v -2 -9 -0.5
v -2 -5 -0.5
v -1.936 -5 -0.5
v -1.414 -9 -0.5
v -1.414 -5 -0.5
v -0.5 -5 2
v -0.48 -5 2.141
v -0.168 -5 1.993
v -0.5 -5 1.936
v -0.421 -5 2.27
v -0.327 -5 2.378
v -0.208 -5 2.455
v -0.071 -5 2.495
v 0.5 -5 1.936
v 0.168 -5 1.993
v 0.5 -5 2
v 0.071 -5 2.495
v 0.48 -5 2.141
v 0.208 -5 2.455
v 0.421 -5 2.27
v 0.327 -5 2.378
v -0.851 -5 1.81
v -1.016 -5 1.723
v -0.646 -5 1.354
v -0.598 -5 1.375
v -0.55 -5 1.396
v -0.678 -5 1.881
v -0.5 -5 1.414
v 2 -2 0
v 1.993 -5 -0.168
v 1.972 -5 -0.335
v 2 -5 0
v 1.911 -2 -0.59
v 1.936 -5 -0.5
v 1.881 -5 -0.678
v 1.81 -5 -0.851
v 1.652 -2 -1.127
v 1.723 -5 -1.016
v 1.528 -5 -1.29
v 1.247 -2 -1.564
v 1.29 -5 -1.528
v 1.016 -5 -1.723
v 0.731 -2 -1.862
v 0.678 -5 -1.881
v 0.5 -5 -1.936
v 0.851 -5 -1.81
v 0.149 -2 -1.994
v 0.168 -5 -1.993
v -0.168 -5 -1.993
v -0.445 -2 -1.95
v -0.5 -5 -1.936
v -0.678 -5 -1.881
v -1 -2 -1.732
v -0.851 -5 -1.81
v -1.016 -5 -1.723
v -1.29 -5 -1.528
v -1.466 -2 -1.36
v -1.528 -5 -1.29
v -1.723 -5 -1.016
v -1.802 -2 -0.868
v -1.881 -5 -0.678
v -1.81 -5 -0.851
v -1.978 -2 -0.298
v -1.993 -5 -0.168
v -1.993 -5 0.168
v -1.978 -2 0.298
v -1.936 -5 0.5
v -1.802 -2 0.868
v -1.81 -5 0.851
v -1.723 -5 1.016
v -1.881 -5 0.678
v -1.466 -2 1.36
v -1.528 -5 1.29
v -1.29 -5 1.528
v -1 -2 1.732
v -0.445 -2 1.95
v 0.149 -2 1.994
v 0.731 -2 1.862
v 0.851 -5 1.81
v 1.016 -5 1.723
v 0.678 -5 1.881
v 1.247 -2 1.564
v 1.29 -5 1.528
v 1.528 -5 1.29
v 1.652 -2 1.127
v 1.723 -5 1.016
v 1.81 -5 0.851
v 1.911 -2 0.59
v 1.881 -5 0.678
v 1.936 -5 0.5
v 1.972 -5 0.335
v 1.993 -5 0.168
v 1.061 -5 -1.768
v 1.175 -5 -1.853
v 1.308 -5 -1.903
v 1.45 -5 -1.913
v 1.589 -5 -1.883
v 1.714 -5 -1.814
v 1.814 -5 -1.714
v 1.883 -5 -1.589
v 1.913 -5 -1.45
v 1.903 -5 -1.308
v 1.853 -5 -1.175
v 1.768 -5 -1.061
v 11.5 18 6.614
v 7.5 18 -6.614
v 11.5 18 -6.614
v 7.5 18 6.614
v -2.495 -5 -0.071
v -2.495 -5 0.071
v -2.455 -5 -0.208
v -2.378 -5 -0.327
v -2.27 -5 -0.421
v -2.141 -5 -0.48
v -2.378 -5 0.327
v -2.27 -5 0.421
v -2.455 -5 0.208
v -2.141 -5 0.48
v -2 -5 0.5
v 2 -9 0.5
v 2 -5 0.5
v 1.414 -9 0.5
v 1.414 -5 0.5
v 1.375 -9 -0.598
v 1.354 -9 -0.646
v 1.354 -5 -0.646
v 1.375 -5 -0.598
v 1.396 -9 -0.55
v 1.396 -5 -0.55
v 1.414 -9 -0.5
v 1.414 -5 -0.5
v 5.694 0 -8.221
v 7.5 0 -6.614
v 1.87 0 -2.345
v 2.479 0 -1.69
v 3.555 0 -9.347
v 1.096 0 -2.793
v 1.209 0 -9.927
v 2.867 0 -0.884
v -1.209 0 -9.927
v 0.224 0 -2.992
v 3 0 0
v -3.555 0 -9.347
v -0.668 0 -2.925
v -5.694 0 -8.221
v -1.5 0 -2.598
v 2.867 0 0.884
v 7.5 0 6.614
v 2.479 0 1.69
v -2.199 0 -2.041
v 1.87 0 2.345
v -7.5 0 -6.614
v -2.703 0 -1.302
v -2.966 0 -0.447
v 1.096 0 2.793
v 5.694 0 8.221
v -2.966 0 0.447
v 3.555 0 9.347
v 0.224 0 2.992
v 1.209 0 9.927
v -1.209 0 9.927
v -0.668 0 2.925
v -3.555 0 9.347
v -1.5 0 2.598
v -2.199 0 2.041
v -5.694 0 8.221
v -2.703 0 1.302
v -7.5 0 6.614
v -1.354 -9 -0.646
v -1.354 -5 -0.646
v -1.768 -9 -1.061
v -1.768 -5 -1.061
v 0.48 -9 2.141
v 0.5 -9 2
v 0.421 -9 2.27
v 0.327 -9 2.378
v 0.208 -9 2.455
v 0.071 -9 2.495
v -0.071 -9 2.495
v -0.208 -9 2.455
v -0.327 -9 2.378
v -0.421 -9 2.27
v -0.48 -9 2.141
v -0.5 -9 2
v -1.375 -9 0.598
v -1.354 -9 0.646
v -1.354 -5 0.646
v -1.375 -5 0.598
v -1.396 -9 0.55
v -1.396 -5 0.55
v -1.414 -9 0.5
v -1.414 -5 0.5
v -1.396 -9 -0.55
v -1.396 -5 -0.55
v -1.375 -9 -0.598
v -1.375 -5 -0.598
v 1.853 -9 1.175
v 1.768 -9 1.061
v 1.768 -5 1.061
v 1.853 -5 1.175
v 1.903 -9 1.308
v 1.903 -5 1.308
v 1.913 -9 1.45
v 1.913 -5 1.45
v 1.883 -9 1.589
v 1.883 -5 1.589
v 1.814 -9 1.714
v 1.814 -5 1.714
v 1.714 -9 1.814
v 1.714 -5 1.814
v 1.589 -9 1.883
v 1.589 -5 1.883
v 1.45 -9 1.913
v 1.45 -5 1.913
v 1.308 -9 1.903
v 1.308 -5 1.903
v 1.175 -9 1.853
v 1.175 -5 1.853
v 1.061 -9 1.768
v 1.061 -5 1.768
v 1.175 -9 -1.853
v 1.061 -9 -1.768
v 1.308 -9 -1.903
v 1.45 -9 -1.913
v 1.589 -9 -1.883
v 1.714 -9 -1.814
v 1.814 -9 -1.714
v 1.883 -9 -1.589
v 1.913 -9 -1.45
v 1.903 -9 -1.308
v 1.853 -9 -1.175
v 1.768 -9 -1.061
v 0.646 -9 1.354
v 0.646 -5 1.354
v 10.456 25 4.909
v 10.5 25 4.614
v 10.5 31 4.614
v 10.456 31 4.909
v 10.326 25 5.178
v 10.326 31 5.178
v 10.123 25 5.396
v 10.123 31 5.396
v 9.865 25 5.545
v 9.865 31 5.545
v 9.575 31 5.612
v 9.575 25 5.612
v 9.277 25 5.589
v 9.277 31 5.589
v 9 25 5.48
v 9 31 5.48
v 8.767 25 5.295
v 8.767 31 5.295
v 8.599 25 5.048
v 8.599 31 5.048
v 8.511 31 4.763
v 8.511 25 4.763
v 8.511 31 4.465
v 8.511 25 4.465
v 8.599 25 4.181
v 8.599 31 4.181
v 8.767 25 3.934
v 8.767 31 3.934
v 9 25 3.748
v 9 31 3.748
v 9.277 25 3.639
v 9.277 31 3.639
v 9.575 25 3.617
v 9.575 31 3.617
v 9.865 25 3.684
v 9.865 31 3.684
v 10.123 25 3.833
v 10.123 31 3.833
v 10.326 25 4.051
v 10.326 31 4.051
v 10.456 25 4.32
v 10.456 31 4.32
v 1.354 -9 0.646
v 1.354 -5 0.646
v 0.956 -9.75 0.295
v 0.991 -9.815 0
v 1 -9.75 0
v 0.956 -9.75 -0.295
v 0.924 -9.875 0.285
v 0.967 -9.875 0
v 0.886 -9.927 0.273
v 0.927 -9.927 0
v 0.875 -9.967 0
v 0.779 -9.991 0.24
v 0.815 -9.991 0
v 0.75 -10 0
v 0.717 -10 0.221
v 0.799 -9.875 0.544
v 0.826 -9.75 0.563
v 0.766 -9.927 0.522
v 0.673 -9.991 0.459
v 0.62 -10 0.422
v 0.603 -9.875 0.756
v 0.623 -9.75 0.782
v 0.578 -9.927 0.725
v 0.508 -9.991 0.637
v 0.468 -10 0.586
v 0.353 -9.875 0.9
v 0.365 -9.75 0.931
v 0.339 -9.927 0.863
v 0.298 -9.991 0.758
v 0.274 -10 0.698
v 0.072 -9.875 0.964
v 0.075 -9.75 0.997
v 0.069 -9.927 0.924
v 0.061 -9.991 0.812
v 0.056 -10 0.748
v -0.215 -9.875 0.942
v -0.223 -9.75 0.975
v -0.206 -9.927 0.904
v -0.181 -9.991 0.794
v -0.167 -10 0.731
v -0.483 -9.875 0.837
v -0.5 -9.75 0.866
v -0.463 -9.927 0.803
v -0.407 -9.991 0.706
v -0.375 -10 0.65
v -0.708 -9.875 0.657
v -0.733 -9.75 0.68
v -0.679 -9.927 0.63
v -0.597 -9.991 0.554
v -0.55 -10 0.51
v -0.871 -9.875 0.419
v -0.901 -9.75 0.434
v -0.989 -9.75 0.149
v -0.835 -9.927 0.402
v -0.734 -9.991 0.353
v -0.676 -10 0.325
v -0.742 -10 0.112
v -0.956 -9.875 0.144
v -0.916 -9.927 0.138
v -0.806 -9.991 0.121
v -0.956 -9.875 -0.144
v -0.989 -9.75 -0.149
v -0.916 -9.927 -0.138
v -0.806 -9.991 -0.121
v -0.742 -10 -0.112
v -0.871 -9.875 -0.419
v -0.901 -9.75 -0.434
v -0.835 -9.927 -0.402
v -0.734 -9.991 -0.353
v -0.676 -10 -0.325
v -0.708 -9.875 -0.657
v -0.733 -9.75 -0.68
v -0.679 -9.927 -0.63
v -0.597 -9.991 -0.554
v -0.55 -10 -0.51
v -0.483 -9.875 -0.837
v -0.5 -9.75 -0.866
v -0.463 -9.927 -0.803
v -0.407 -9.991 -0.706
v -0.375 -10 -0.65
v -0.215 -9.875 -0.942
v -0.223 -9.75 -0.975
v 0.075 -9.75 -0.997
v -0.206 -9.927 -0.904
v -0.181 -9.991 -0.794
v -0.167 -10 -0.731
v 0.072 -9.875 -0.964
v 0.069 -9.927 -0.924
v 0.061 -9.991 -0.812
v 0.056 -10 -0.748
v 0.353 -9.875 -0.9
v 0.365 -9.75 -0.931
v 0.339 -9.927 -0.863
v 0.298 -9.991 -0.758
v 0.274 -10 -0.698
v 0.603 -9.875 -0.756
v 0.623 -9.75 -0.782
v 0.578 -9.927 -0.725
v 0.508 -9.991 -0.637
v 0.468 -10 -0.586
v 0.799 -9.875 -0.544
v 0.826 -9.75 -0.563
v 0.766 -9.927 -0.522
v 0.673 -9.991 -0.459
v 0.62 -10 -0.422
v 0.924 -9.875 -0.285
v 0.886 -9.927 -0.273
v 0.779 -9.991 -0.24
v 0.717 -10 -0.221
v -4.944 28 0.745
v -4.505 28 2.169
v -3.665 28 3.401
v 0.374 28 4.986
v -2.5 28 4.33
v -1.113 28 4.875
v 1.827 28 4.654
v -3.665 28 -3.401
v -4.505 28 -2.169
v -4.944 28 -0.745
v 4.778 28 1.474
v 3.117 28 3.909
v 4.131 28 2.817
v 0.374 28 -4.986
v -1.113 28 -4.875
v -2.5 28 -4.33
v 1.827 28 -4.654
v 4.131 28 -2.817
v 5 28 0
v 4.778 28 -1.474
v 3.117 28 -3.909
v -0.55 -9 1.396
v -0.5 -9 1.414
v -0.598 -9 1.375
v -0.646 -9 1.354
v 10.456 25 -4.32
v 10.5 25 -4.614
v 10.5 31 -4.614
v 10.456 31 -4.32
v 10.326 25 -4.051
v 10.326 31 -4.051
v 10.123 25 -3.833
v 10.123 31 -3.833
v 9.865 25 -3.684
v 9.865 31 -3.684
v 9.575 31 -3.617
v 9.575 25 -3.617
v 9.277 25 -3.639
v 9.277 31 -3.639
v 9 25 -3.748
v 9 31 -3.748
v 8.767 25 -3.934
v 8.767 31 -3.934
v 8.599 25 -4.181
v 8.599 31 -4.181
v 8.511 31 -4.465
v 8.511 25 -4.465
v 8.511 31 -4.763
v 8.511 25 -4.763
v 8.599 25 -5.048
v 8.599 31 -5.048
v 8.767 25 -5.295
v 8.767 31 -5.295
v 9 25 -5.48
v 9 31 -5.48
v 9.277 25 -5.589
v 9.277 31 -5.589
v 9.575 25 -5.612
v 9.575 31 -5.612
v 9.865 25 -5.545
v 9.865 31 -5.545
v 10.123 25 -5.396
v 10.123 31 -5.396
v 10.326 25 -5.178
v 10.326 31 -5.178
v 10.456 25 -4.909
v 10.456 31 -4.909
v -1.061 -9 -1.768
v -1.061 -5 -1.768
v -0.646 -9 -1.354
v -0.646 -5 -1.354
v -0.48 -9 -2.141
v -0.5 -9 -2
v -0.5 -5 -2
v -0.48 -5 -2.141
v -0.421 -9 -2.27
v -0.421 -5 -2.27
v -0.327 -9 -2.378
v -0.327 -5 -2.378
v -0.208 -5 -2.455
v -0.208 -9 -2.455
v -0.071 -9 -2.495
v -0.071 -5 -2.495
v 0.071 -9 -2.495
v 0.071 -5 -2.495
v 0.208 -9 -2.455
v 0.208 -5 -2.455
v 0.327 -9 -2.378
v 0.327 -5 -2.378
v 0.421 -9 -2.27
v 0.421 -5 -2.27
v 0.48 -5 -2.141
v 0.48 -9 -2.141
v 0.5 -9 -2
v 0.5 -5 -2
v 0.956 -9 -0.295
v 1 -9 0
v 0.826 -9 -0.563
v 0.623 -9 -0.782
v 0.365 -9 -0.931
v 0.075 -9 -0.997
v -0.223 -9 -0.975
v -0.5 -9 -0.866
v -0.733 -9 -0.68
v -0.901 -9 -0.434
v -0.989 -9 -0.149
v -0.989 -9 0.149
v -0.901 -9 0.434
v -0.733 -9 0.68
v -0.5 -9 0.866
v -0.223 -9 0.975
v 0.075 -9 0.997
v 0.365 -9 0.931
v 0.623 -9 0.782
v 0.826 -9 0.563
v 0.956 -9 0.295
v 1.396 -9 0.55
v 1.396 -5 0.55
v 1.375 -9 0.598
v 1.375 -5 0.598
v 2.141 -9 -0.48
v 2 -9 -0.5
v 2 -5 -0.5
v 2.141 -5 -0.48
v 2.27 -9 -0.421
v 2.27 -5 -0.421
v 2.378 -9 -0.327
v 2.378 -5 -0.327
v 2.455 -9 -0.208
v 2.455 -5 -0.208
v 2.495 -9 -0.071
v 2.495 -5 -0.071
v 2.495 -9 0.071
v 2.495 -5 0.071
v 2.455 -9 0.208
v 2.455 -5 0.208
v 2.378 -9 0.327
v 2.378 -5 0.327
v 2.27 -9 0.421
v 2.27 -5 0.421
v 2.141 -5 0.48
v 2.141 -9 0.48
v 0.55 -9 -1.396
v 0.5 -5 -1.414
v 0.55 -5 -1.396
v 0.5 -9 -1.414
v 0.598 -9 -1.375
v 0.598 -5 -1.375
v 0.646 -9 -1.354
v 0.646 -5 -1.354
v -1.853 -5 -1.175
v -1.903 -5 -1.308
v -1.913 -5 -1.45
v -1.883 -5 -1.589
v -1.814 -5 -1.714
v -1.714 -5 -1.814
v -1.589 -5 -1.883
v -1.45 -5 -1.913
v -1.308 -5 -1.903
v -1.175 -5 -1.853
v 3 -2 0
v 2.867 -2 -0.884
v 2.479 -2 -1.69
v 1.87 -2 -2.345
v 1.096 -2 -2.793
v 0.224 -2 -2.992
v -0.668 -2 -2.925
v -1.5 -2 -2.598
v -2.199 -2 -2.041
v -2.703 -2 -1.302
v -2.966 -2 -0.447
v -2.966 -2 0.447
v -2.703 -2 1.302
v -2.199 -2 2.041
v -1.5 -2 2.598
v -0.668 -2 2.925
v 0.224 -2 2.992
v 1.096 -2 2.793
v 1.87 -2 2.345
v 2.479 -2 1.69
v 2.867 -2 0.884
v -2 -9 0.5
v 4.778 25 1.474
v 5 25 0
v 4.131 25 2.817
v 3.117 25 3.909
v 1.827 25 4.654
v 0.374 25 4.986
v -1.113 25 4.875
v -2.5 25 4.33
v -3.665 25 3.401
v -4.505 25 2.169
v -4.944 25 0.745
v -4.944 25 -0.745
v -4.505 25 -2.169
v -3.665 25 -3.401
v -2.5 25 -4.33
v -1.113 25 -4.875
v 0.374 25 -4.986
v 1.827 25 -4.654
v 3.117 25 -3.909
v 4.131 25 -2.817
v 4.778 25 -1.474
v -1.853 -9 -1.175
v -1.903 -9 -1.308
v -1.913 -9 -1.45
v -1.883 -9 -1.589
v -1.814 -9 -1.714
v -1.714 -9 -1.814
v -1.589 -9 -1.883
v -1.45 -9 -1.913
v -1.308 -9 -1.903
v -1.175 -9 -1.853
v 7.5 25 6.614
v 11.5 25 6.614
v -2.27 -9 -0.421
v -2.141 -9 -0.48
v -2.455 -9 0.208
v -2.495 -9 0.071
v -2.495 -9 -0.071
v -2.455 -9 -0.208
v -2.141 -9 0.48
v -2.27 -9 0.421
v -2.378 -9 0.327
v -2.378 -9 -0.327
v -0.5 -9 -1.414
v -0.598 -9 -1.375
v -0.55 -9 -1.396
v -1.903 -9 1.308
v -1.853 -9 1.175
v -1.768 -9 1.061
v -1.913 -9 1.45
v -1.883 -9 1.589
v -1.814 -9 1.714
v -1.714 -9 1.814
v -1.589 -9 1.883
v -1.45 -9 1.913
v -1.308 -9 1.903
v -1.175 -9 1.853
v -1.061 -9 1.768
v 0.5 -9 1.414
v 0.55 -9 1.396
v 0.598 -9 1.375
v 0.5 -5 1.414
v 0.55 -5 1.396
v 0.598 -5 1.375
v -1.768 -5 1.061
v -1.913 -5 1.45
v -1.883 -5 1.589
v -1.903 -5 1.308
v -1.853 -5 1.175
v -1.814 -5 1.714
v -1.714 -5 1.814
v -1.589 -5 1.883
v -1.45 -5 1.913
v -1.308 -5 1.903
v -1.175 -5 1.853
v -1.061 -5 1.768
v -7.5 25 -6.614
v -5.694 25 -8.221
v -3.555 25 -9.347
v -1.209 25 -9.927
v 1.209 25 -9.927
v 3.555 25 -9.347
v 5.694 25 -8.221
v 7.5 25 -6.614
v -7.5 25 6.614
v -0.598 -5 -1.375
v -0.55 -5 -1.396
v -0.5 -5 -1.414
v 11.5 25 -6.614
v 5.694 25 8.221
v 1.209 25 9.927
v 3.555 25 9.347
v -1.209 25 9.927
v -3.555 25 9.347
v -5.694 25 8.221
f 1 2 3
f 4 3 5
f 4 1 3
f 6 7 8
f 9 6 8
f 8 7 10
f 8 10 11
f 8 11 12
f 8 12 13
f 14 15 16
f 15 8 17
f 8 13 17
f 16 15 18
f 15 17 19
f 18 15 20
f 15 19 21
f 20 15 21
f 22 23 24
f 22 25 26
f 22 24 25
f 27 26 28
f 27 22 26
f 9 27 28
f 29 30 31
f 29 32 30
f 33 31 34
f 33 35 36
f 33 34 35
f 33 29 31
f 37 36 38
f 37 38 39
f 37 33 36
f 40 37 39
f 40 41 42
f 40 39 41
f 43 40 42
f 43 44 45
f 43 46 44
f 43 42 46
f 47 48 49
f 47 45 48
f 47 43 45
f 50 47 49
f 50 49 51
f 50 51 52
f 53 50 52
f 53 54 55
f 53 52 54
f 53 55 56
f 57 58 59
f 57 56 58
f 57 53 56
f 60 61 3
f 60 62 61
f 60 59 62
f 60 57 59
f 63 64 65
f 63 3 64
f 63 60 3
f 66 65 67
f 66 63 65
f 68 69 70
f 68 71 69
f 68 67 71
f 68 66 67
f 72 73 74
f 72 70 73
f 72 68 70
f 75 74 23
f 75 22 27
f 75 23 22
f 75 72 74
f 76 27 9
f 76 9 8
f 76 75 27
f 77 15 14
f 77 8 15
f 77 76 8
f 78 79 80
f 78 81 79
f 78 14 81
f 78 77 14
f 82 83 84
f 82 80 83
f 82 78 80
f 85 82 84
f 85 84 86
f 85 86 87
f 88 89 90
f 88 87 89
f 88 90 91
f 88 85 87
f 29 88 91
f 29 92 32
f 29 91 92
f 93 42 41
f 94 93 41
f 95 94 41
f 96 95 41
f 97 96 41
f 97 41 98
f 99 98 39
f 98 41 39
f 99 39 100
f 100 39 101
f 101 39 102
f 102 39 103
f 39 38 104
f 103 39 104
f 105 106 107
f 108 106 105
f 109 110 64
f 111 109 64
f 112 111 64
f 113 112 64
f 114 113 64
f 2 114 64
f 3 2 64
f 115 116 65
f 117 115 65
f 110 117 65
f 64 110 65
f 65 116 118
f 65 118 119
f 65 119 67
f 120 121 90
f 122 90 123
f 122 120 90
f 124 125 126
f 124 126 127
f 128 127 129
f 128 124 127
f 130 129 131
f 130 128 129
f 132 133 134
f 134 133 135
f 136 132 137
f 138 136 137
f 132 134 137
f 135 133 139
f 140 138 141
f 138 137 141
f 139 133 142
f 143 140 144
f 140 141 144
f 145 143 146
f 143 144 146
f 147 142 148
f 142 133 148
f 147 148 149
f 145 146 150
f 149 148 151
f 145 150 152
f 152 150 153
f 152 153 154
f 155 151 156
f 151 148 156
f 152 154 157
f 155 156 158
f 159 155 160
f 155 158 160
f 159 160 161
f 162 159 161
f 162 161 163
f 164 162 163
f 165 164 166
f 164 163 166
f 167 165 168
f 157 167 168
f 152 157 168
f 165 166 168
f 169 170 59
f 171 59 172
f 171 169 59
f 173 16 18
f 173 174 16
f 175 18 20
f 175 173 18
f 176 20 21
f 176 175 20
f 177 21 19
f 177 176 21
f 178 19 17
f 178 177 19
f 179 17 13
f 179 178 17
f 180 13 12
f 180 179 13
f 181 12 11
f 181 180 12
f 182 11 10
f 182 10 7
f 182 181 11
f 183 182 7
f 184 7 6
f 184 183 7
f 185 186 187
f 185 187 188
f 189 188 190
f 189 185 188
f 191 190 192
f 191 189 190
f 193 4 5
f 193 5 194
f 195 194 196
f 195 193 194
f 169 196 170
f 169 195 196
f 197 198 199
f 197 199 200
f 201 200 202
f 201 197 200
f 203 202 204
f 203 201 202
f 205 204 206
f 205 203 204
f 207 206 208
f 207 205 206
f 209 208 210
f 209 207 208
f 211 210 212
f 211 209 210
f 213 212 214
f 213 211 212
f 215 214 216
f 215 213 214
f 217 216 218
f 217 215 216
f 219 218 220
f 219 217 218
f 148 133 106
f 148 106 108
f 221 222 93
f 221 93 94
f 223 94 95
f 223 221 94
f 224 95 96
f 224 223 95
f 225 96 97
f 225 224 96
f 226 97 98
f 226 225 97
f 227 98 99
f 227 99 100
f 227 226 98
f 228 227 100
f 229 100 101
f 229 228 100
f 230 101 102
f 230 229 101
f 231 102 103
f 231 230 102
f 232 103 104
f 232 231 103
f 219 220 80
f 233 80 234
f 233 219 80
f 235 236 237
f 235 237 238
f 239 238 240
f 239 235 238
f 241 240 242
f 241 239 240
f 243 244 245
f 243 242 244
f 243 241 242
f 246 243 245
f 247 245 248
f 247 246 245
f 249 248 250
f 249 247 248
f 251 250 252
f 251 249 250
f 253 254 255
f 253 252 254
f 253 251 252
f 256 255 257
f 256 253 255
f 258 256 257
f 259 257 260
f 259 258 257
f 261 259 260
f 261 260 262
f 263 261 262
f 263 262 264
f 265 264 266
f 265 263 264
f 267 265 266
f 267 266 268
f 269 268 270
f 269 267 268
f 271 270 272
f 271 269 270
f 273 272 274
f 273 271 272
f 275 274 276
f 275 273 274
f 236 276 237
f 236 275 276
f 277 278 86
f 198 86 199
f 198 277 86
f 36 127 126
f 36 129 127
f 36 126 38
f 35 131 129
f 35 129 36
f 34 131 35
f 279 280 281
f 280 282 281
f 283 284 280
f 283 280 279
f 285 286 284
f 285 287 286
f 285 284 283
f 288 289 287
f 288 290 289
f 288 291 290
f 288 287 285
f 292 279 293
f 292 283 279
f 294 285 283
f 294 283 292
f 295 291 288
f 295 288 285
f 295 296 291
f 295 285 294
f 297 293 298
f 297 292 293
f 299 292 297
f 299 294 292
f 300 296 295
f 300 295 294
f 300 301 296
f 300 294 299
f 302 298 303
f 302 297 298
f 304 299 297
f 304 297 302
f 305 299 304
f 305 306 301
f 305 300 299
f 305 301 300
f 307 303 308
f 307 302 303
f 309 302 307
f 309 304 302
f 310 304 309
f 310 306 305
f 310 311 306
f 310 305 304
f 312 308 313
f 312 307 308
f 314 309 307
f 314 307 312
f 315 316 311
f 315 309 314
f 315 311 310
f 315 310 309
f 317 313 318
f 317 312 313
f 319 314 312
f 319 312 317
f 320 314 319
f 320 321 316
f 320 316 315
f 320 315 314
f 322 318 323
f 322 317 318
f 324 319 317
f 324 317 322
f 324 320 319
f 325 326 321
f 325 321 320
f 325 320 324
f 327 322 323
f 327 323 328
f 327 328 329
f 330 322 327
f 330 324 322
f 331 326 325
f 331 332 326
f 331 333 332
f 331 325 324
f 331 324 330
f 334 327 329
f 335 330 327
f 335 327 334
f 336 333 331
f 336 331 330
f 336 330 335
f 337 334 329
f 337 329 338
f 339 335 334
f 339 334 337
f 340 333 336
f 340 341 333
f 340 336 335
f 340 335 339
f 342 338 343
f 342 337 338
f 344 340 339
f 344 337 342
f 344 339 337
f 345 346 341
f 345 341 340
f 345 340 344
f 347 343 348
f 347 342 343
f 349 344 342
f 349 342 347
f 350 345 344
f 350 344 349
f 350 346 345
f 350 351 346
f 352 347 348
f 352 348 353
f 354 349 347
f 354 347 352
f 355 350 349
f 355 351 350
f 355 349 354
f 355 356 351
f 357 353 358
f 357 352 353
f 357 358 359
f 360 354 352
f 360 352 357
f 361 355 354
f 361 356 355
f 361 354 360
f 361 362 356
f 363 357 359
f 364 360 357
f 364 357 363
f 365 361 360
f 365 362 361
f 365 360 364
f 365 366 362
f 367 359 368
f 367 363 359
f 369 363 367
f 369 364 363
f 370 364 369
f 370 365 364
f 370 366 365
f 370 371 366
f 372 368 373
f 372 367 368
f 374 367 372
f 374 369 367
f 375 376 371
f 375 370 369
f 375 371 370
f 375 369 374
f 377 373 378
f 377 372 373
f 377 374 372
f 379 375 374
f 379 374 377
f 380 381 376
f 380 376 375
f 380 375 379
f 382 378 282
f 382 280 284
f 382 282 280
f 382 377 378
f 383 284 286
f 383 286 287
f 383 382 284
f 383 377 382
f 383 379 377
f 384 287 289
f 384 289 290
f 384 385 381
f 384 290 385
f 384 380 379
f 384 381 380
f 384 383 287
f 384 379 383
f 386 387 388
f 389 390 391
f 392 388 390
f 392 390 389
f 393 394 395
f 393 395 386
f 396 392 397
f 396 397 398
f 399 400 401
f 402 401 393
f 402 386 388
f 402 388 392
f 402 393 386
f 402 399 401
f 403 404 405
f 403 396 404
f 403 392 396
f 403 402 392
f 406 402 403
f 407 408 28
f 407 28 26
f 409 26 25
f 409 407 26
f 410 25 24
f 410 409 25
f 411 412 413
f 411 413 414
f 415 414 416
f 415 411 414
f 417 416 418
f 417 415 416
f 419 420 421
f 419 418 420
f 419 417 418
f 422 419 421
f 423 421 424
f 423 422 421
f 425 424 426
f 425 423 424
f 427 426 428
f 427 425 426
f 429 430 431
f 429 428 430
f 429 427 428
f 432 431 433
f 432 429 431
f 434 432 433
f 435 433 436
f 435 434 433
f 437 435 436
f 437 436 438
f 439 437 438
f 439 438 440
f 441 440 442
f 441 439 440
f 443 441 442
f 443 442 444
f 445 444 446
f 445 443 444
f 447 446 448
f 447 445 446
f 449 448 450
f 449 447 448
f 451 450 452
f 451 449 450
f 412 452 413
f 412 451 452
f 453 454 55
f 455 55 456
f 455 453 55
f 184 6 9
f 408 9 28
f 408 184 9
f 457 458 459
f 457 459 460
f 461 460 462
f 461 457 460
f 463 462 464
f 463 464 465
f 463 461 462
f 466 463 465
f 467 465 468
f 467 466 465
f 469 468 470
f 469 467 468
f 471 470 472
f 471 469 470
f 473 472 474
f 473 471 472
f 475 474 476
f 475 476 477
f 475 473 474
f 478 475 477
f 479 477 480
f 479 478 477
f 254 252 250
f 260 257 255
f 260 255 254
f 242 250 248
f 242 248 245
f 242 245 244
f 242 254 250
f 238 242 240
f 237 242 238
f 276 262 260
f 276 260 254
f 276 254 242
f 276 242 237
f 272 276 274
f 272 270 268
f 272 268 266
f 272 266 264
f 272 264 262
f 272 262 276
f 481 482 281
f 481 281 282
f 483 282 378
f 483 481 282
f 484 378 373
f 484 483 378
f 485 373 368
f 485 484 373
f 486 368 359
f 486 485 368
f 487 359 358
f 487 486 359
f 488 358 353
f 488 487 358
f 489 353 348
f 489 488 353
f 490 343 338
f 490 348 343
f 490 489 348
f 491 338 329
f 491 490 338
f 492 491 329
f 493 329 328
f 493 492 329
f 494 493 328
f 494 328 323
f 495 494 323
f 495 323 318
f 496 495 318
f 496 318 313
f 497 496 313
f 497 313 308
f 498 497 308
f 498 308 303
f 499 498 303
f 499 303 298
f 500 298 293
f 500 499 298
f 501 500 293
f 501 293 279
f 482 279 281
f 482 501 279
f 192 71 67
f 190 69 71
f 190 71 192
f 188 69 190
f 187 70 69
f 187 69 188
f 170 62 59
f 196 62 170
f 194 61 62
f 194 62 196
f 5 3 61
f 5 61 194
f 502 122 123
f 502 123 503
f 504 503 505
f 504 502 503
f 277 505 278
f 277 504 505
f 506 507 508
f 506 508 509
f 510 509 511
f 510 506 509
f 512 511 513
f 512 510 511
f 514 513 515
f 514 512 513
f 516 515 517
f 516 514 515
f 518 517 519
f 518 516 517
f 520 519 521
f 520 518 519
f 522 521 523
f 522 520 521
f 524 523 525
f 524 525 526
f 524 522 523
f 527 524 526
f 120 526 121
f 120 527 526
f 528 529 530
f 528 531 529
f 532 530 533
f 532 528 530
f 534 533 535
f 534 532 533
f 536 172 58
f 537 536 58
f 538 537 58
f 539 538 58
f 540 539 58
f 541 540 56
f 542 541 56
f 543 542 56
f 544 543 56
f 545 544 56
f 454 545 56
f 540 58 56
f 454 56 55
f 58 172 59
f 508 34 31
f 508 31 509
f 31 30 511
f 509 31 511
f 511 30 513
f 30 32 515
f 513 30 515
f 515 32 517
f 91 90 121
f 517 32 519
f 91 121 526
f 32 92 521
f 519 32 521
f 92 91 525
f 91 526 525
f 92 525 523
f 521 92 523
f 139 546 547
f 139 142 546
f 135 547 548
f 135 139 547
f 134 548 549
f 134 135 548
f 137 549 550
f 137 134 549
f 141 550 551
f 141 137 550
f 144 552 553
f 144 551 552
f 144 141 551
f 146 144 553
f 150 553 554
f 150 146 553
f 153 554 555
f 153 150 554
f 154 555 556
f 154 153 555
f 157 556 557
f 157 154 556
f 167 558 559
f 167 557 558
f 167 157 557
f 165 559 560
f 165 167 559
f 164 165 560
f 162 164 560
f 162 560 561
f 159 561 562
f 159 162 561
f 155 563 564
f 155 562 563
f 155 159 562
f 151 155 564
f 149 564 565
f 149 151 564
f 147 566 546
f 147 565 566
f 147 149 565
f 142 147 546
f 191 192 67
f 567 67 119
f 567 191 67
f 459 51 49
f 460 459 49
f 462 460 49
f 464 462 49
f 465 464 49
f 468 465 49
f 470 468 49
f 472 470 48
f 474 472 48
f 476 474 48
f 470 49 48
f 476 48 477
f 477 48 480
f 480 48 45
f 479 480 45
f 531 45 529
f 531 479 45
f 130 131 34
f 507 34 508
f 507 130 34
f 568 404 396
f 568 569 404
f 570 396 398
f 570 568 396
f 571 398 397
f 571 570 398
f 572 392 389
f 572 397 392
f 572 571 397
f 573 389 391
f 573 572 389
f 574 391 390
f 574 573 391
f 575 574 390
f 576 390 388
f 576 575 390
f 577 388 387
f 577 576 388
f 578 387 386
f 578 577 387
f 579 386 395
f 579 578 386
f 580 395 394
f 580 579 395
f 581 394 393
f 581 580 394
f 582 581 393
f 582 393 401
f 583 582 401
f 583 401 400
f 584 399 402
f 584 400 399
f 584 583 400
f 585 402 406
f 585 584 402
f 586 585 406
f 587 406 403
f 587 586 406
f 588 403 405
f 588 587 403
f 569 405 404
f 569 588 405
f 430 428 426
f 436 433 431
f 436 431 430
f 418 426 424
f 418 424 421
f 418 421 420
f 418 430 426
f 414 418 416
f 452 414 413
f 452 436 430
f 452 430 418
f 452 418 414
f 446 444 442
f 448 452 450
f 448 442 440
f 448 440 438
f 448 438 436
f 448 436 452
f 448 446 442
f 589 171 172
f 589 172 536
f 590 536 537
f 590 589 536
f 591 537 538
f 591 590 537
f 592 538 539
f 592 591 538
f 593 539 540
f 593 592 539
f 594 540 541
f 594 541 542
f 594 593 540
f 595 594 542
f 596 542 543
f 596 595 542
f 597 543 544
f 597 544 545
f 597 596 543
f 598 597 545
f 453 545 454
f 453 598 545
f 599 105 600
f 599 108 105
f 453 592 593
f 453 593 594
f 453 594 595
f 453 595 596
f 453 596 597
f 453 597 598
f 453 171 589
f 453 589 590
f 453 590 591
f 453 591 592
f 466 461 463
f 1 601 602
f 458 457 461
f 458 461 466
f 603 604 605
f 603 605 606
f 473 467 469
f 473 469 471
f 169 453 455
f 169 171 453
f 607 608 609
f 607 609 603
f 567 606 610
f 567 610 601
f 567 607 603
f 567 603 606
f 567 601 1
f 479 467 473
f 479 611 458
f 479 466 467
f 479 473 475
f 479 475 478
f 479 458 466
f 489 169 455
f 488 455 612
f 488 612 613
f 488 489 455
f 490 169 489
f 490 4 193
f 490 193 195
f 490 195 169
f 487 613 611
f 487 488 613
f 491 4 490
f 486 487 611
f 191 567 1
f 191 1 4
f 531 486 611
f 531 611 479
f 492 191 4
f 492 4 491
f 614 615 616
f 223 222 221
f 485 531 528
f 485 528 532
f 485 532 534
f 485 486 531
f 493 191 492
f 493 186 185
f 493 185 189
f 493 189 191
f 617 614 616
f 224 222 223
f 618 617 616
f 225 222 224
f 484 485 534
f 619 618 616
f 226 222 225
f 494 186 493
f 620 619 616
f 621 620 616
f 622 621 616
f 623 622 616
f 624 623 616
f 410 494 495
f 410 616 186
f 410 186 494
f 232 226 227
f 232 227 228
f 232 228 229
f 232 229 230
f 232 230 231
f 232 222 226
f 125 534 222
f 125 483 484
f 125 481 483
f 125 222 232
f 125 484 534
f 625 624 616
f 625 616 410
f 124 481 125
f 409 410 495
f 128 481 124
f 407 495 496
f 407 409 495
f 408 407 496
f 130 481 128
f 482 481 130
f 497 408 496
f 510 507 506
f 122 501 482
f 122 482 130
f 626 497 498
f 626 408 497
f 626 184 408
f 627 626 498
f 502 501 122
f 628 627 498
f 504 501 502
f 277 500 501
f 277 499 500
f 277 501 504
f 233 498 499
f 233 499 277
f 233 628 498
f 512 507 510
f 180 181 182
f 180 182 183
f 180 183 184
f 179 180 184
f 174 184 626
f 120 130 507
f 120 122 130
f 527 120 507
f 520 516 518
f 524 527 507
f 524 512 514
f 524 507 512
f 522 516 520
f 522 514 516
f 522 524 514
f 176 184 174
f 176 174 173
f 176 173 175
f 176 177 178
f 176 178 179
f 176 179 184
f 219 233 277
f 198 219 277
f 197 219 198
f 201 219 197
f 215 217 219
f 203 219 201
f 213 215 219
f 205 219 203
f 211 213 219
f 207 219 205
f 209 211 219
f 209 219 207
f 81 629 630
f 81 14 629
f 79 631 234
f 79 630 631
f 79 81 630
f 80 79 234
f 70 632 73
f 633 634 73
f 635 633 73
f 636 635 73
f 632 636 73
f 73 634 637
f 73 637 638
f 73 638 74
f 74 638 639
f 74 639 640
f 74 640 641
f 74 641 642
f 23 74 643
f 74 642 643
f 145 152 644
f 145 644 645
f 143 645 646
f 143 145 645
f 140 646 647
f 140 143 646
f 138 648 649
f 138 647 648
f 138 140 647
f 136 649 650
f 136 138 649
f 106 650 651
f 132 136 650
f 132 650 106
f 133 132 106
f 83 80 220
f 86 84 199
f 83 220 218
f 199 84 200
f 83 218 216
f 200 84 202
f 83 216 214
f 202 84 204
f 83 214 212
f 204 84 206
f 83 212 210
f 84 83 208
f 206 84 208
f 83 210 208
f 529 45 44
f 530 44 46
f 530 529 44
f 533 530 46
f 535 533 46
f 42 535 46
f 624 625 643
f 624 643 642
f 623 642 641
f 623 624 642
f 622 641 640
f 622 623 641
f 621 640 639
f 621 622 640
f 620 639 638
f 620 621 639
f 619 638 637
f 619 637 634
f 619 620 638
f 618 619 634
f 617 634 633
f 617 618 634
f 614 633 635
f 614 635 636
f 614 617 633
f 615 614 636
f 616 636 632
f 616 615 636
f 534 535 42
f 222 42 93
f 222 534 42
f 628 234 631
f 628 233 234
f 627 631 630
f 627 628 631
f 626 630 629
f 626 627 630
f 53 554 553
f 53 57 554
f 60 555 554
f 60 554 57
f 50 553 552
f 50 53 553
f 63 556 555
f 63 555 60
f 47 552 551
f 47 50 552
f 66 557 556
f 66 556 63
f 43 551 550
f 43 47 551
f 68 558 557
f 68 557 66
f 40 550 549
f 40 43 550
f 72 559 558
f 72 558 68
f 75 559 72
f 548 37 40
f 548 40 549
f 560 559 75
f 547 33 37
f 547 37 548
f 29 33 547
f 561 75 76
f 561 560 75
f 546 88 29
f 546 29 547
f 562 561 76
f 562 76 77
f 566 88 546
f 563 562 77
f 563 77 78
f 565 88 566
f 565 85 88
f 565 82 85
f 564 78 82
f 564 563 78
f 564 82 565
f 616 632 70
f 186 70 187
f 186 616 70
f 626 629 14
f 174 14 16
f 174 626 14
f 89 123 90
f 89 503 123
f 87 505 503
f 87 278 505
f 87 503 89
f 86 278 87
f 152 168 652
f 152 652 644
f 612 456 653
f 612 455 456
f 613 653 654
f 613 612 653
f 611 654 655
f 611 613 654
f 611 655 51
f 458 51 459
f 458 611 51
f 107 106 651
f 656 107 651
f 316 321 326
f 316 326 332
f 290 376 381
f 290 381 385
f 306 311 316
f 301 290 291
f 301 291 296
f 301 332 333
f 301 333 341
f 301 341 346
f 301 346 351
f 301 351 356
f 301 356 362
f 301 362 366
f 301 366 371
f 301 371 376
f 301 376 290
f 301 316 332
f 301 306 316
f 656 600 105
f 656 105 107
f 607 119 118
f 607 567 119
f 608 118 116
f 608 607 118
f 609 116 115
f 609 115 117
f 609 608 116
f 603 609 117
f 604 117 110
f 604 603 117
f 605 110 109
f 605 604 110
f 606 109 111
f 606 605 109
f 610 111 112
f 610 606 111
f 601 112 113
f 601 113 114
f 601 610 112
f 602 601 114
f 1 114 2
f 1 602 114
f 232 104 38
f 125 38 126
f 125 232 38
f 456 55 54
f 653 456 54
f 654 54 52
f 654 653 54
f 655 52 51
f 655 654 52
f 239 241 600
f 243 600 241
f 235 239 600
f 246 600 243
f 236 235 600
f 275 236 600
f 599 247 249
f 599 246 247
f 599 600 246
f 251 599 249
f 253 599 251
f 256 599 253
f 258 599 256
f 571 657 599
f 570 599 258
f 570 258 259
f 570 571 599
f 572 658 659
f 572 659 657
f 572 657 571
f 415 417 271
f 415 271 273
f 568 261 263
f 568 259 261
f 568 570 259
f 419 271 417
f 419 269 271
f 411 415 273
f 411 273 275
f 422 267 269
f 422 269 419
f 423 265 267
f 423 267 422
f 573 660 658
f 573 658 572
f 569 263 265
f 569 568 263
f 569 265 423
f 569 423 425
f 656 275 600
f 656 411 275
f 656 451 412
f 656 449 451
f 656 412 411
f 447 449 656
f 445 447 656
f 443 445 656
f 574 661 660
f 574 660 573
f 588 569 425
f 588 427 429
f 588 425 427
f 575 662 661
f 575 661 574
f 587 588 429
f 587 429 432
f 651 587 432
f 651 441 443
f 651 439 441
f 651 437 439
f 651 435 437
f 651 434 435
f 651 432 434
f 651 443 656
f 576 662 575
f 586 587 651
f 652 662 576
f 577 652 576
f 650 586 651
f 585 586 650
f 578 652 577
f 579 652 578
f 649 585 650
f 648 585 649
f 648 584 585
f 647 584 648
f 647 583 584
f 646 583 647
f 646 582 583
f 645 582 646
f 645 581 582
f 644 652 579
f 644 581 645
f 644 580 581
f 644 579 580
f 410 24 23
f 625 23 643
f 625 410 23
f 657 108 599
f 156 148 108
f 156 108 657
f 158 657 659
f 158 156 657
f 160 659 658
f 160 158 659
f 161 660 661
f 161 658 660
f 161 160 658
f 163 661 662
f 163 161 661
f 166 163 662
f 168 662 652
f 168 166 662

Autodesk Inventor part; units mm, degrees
ref_plane "YZ Plane" through (0, 0, 0) normal (1, 0, 0) x (0, 1, 0)
ref_plane "XZ Plane" through (0, 0, 0) normal (0, 1, 0) x (-1, 0, 0)
ref_plane "XY Plane" through (0, 0, 0) normal (0, 0, 1) x (1, 0, 0)
sketch "Sketch1" plane through (0, 0, 0) normal (0, 1, 0) x (-1, 0, 0)
  line L0 (7.5, 6.6144) -> (7.5, -6.6144)
  line L1 (-7.5, -6.6144) -> (-7.5, 6.6144)
  arc A0 (-7.5, -6.6144) -> (7.5, -6.6144) centre (0, 0) ccw
  arc A1 (7.5, 6.6144) -> (-7.5, 6.6144) centre (0, 0) ccw
  dimension "d1" = 15
  dimension "d2" = 7.5
  dimension "d3" = 10
  dimension "d4" = 10
extrude "Extrusion1" add sketch "Sketch1" along normal blind 25
sketch "Sketch2" plane through (0, 0, 0) normal (0, -1, 0) x (1, 0, 0)
  circle A0 centre (0, 0) radius 3
  dimension "d7" = 6
extrude "Extrusion2" add sketch "Sketch2" along normal blind 2
sketch "Sketch3" plane through (0, -2, 0) normal (0, -1, 0) x (1, 0, 0)
  circle A0 centre (0, 0) radius 2
  dimension "d10" = 4
extrude "Extrusion3" add sketch "Sketch3" along normal blind 3
sketch "Sketch4" plane through (0, 25, 0) normal (0, 1, 0) x (1, 0, 0)
  circle A0 centre (0, 0) radius 2 projected
  circle A1 centre (0, 0) radius 5
  dimension "d13" = 10
extrude "Extrusion4" add sketch "Sketch4" along normal blind 3 contours A0 | A1
sketch "Sketch5" plane through (7.5, 0, 6.6144) normal (1, 0, 0) x (0, 0, -1)
  line L0 (0, 0) -> (0, 25) projected
  line L1 (13.2288, 0) -> (13.2288, 25) projected
  line L2 (0, 25) -> (13.2288, 25)
  line L3 (13.2288, 25) -> (13.2288, 18)
  line L4 (13.2288, 18) -> (0, 18)
  line L5 (0, 18) -> (0, 25)
  point P0 (6.6144, 0)
  point P1 (0, 18)
  dimension "d16" = 7
extrude "Extrusion5" add sketch "Sketch5" along normal blind 4
sketch "Sketch7" plane through (0, -5, 0) normal (0, -1, 0) x (1, 0, 0)
  circle A0 centre (0, 0) radius 2.5
  dimension "d21" = 5
extrude "Extrusion7" add sketch "Sketch7" along normal blind 4
sketch "Sketch8" plane through (0, -9, 0) normal (0, -1, 0) x (1, 0, 0)
  circle A0 centre (0, 0) radius 1.5
  circle A1 centre (0, 0) radius 2.5
  line L0 (-0.5, 1) -> (0.5, 1)
  line L1 (0.5, 1) -> (0.5, 2)
  line L2 (0.5, 2) -> (-0.5, 2) construction
  line L3 (-0.5, 2) -> (-0.5, 1)
  line L4 (-0.5, 1) -> (0.5, 2) construction
  line L5 (0.5, 1) -> (-0.5, 2) construction
  circle A2 centre (0, 2) radius 0.5
  line L6 (-0.3536, 1.0607) -> (-1.0607, 1.7678)
  line L7 (-1.0607, 1.7678) -> (-1.7678, 1.0607) construction
  line L8 (-1.0607, 0.3536) -> (-1.0607, 1.7678) construction
  circle A3 centre (-1.4142, 1.4142) radius 0.5
  line L9 (-1.7678, 1.0607) -> (-1.0607, 0.3536)
  line L10 (-1, 0.5) -> (-2, 0.5)
  line L11 (-2, 0.5) -> (-2, -0.5) construction
  line L12 (-1, -0.5) -> (-2, 0.5) construction
  circle A4 centre (-2, 0) radius 0.5
  line L13 (-2, -0.5) -> (-1, -0.5)
  line L14 (-1.0607, -0.3536) -> (-1.7678, -1.0607)
  line L15 (-1.7678, -1.0607) -> (-1.0607, -1.7678) construction
  line L16 (-0.3536, -1.0607) -> (-1.7678, -1.0607) construction
  circle A5 centre (-1.4142, -1.4142) radius 0.5
  line L17 (-1.0607, -1.7678) -> (-0.3536, -1.0607)
  line L18 (-0.5, -1) -> (-0.5, -2)
  line L19 (-0.5, -2) -> (0.5, -2) construction
  line L20 (0.5, -1) -> (-0.5, -2) construction
  circle A6 centre (0, -2) radius 0.5
  line L21 (0.5, -2) -> (0.5, -1)
  line L22 (0.3536, -1.0607) -> (1.0607, -1.7678)
  line L23 (1.0607, -1.7678) -> (1.7678, -1.0607) construction
  line L24 (1.0607, -0.3536) -> (1.0607, -1.7678) construction
  circle A7 centre (1.4142, -1.4142) radius 0.5
  line L25 (1.7678, -1.0607) -> (1.0607, -0.3536)
  line L26 (1, -0.5) -> (2, -0.5)
  line L27 (2, -0.5) -> (2, 0.5) construction
  line L28 (1, 0.5) -> (2, -0.5) construction
  circle A8 centre (2, 0) radius 0.5
  line L29 (2, 0.5) -> (1, 0.5)
  line L30 (1.0607, 0.3536) -> (1.7678, 1.0607)
  line L31 (1.7678, 1.0607) -> (1.0607, 1.7678) construction
  line L32 (0.3536, 1.0607) -> (1.7678, 1.0607) construction
  circle A9 centre (1.4142, 1.4142) radius 0.5
  line L33 (1.0607, 1.7678) -> (0.3536, 1.0607)
  point P0 (0, 1.5)
  point P1 (-1.0607, 1.0607)
  point P2 (-1.5, 0)
  point P3 (-1.0607, -1.0607)
  point P4 (0, -1.5)
  point P5 (1.0607, -1.0607)
  point P6 (1.3536, -0.6464)
  point P7 (1.7678, -1.7678)
  point P8 (0, 2.5)
  point P9 (0.5, 1.4142)
  point P10 (1.0607, -1.7678)
  point P11 (0.6464, -1.3536)
  point P12 (0.5, -1.4142)
  point P13 (0, -2.5)
  point P14 (-0.5, -1.4142)
  point P15 (-0.6464, -1.3536)
  point P16 (-1.7678, -1.7678)
  point P17 (-1.7678, -1.0607)
  point P18 (-1.3536, -0.6464)
  point P19 (-1.4142, -0.5)
  point P20 (-2.5, 0)
  point P21 (-1.4142, 0.5)
  point P22 (-1.3536, 0.6464)
  point P23 (-1.7678, 1.7678)
  point P24 (-0.6464, 1.3536)
  point P25 (-0.5, 1.4142)
  point P26 (1.5, 0)
  point P27 (1.0607, 1.0607)
  point P28 (0.6464, 1.3536)
  point P29 (1.7678, 1.7678)
  point P30 (1.3536, 0.6464)
  point P31 (1.4142, 0.5)
  point P32 (2.5, 0)
  point P33 (1.4142, -0.5)
  dimension "d24" = 3
  dimension "d25" = 5
  dimension "d26" = 1
  dimension "d29" = 360
extrude "Extrusion8" cut sketch "Sketch8" against normal blind 4 contours A0 L30 A9 A1 A8 L29 | L26 A8 A1 A7 L25 A0 | A9 L33 A0 L1 A2 A1 | A1 A6 L21 A0 L22 A7 | A2 L3 A0 L6 A3 A1 | A1 A5 L17 A0 L18 A6 | A3 L9 A0 L10 A4 A1 | A1 A4 L13 A0 L14 A5
sketch "Sketch9" plane through (0, -9, 0) normal (0, -1, 0) x (1, 0, 0)
  circle A0 centre (0, 0) radius 1
  dimension "d33" = 2
extrude "Extrusion9" add sketch "Sketch9" along normal blind 1
fillet "Fillet1" radius 0.25 1 edges at (-1, -10, 0)
sketch "Sketch10" plane through (0, 25, 0) normal (0, 1, 0) x (1, 0, 0)
  circle A0 centre (9.5, 4.6144) radius 1
  circle A1 centre (9.5, -4.6144) radius 1
  line L0 (11.5, 6.6144) -> (11.5, -6.6144) projected
  line L1 (7.5, 6.6144) -> (11.5, 6.6144) projected
  line L2 (7.5, -6.6144) -> (11.5, -6.6144) projected
  point P0 (0, 0)
  dimension "d37" = 2
  dimension "d38" = 2
  dimension "d39" = 2
  dimension "d40" = 2
  dimension "d41" = 2
  dimension "d42" = 2
extrude "Extrusion10" add sketch "Sketch10" along normal blind 6
properties part number "motor"
